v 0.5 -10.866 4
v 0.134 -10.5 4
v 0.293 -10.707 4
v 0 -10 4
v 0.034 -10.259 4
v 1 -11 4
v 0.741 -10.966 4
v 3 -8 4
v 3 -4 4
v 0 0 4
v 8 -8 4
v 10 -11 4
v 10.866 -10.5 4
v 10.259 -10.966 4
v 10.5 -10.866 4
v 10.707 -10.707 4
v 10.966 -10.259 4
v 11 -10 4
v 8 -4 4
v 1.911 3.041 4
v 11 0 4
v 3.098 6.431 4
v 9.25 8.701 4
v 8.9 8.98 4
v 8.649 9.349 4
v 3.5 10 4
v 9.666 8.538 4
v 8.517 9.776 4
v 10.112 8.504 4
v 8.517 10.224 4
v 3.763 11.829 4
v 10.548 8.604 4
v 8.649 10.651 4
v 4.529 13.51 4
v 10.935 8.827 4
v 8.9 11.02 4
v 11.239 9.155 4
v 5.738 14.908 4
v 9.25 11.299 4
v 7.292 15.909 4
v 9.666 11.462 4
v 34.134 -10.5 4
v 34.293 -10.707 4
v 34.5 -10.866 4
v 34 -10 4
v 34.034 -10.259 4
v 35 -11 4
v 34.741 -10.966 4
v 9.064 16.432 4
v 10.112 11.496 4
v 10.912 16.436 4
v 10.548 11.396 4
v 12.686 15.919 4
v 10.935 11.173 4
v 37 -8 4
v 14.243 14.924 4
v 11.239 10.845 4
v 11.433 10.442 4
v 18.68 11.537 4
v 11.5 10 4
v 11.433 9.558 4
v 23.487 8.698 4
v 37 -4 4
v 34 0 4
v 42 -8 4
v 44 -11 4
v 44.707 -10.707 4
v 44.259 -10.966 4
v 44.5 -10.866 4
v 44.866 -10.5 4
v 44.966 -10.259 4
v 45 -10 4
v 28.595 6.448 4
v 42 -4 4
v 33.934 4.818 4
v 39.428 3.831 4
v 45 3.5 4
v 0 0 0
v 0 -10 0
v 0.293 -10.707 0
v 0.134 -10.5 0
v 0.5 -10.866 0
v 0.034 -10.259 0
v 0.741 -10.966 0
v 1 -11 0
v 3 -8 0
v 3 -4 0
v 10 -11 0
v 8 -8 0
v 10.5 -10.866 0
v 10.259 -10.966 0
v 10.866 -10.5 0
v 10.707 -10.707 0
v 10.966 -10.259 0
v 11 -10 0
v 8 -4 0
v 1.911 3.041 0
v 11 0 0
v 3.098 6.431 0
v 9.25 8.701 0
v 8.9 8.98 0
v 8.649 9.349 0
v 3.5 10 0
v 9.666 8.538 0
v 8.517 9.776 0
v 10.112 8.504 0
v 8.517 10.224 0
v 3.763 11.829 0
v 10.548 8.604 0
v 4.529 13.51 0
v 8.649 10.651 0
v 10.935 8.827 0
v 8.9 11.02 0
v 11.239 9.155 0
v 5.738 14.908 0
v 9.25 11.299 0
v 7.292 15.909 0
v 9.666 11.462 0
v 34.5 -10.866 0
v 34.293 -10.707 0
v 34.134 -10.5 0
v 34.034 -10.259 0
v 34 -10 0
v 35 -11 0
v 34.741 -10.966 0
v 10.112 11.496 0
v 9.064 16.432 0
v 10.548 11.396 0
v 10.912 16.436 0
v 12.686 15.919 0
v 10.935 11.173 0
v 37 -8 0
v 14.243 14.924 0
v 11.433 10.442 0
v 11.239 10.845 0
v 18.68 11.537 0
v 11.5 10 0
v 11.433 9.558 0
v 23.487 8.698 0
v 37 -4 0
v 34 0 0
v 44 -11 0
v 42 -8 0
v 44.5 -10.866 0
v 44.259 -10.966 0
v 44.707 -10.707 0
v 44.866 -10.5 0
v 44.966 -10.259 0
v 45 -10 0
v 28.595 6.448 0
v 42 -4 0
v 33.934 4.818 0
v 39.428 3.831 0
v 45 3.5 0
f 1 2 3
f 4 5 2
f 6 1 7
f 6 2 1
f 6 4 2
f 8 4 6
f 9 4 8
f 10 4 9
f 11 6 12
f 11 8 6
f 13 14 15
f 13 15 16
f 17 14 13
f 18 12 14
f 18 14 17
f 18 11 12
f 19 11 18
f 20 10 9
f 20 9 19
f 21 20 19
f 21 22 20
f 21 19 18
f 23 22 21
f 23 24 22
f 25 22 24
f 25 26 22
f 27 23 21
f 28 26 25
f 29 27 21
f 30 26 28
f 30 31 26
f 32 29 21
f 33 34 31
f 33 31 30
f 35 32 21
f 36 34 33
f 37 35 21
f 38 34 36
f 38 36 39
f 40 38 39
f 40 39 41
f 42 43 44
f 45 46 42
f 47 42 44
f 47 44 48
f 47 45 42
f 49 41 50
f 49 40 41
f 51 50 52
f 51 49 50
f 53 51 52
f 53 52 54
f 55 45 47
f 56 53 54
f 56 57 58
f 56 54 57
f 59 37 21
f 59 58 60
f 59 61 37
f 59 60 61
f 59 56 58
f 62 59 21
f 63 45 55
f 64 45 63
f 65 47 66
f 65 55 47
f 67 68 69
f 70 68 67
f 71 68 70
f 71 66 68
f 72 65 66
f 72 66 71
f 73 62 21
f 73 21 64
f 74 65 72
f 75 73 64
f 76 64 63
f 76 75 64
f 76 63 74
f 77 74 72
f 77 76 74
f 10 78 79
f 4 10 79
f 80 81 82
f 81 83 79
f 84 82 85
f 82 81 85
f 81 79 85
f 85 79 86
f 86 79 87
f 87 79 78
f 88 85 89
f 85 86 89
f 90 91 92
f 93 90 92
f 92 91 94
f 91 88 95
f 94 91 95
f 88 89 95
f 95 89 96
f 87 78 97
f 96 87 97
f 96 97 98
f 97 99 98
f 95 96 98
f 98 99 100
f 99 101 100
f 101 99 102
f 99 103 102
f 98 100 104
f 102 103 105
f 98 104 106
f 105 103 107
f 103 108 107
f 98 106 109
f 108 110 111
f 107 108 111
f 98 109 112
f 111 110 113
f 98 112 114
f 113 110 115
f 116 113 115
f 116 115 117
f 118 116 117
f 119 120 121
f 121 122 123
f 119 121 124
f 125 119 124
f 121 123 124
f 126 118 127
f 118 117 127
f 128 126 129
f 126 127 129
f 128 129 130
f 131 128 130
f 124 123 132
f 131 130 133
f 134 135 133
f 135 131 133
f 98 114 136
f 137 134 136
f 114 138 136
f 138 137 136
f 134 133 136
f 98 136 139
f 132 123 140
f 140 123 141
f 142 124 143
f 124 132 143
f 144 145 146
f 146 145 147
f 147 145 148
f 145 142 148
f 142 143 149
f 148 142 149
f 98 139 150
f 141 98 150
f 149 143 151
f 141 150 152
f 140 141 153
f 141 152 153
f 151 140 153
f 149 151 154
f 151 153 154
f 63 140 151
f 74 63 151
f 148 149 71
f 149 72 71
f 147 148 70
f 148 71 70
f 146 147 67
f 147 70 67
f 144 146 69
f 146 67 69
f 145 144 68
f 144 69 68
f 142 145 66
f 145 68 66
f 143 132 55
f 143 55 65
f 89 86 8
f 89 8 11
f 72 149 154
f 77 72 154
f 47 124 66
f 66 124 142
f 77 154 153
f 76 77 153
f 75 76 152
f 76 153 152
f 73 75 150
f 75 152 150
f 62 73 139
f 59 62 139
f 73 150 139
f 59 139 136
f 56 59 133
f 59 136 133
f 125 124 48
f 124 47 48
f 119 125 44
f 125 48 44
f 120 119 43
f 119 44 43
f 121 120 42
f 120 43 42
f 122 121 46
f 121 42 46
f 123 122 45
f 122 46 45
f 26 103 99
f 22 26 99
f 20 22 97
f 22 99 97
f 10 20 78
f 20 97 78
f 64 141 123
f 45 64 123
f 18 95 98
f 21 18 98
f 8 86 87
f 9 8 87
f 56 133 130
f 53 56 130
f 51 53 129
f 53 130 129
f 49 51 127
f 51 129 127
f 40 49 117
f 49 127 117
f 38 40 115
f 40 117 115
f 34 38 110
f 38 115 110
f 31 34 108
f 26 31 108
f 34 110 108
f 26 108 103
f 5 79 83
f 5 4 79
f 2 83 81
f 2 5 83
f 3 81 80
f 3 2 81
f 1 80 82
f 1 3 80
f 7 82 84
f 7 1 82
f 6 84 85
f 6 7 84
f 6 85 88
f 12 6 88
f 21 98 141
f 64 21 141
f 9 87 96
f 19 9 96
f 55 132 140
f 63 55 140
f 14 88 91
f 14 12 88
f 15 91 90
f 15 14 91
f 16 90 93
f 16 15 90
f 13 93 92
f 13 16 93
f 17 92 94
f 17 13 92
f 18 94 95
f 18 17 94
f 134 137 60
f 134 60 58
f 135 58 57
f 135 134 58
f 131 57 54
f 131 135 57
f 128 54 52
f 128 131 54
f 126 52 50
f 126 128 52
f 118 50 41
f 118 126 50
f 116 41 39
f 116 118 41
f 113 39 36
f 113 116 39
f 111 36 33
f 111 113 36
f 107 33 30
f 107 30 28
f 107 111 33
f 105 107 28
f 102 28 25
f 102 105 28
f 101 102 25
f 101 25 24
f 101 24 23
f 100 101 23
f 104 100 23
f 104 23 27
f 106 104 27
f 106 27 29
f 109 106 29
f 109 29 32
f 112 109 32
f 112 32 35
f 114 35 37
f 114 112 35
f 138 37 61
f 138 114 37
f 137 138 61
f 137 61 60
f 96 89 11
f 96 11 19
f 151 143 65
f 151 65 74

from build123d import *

# Parameters (mm, degrees)
SKETCH1_W           = 5
SKETCH1_H           = 4
SKETCH1_R           = 1.5
BOSS_EXTRUDE1_DEPTH = 4
FILLET3_R           = 1


with BuildPart() as part:
    # Sketch1 → Boss-Extrude1 (new body)
    with BuildSketch(Plane.XY):
        with BuildLine():
            ThreePointArc((3.5, 10), (2.599728643, 4.702594975), (0, 0))
            Line((0, 0), (0, -11))
            Line((0, -11), (11, -11))
            Line((11, -11), (11, 0))
            Line((11, 0), (34, 0))
            Line((34, 0), (34, -11))
            Line((34, -11), (45, -11))
            Line((45, -11), (45, 3.5))
            ThreePointArc((45, 3.5), (28.59505774, 6.448232376), (14.243185079, 14.923959828))
            ThreePointArc((14.243185079, 14.923959828), (7.291744382, 15.908921349), (3.5, 10))
        make_face()
        with Locations((5.5, -6)):
            Rectangle(SKETCH1_W, SKETCH1_H, mode=Mode.SUBTRACT)
        with Locations((39.5, -6)):
            Rectangle(SKETCH1_W, SKETCH1_H, mode=Mode.SUBTRACT)
        with Locations((10, 10)):
            Circle(SKETCH1_R, mode=Mode.SUBTRACT)
    extrude(amount=BOSS_EXTRUDE1_DEPTH)

    # Fillet3
    fillet3_edges = [part.edges().sort_by_distance(p)[0] for p in [
        (45, -11, 2),
        (34, -11, 2),
        (11, -11, 2),
        (0, -11, 2),
    ]]
    fillet(fillet3_edges, radius=FILLET3_R)


solid = part.part
